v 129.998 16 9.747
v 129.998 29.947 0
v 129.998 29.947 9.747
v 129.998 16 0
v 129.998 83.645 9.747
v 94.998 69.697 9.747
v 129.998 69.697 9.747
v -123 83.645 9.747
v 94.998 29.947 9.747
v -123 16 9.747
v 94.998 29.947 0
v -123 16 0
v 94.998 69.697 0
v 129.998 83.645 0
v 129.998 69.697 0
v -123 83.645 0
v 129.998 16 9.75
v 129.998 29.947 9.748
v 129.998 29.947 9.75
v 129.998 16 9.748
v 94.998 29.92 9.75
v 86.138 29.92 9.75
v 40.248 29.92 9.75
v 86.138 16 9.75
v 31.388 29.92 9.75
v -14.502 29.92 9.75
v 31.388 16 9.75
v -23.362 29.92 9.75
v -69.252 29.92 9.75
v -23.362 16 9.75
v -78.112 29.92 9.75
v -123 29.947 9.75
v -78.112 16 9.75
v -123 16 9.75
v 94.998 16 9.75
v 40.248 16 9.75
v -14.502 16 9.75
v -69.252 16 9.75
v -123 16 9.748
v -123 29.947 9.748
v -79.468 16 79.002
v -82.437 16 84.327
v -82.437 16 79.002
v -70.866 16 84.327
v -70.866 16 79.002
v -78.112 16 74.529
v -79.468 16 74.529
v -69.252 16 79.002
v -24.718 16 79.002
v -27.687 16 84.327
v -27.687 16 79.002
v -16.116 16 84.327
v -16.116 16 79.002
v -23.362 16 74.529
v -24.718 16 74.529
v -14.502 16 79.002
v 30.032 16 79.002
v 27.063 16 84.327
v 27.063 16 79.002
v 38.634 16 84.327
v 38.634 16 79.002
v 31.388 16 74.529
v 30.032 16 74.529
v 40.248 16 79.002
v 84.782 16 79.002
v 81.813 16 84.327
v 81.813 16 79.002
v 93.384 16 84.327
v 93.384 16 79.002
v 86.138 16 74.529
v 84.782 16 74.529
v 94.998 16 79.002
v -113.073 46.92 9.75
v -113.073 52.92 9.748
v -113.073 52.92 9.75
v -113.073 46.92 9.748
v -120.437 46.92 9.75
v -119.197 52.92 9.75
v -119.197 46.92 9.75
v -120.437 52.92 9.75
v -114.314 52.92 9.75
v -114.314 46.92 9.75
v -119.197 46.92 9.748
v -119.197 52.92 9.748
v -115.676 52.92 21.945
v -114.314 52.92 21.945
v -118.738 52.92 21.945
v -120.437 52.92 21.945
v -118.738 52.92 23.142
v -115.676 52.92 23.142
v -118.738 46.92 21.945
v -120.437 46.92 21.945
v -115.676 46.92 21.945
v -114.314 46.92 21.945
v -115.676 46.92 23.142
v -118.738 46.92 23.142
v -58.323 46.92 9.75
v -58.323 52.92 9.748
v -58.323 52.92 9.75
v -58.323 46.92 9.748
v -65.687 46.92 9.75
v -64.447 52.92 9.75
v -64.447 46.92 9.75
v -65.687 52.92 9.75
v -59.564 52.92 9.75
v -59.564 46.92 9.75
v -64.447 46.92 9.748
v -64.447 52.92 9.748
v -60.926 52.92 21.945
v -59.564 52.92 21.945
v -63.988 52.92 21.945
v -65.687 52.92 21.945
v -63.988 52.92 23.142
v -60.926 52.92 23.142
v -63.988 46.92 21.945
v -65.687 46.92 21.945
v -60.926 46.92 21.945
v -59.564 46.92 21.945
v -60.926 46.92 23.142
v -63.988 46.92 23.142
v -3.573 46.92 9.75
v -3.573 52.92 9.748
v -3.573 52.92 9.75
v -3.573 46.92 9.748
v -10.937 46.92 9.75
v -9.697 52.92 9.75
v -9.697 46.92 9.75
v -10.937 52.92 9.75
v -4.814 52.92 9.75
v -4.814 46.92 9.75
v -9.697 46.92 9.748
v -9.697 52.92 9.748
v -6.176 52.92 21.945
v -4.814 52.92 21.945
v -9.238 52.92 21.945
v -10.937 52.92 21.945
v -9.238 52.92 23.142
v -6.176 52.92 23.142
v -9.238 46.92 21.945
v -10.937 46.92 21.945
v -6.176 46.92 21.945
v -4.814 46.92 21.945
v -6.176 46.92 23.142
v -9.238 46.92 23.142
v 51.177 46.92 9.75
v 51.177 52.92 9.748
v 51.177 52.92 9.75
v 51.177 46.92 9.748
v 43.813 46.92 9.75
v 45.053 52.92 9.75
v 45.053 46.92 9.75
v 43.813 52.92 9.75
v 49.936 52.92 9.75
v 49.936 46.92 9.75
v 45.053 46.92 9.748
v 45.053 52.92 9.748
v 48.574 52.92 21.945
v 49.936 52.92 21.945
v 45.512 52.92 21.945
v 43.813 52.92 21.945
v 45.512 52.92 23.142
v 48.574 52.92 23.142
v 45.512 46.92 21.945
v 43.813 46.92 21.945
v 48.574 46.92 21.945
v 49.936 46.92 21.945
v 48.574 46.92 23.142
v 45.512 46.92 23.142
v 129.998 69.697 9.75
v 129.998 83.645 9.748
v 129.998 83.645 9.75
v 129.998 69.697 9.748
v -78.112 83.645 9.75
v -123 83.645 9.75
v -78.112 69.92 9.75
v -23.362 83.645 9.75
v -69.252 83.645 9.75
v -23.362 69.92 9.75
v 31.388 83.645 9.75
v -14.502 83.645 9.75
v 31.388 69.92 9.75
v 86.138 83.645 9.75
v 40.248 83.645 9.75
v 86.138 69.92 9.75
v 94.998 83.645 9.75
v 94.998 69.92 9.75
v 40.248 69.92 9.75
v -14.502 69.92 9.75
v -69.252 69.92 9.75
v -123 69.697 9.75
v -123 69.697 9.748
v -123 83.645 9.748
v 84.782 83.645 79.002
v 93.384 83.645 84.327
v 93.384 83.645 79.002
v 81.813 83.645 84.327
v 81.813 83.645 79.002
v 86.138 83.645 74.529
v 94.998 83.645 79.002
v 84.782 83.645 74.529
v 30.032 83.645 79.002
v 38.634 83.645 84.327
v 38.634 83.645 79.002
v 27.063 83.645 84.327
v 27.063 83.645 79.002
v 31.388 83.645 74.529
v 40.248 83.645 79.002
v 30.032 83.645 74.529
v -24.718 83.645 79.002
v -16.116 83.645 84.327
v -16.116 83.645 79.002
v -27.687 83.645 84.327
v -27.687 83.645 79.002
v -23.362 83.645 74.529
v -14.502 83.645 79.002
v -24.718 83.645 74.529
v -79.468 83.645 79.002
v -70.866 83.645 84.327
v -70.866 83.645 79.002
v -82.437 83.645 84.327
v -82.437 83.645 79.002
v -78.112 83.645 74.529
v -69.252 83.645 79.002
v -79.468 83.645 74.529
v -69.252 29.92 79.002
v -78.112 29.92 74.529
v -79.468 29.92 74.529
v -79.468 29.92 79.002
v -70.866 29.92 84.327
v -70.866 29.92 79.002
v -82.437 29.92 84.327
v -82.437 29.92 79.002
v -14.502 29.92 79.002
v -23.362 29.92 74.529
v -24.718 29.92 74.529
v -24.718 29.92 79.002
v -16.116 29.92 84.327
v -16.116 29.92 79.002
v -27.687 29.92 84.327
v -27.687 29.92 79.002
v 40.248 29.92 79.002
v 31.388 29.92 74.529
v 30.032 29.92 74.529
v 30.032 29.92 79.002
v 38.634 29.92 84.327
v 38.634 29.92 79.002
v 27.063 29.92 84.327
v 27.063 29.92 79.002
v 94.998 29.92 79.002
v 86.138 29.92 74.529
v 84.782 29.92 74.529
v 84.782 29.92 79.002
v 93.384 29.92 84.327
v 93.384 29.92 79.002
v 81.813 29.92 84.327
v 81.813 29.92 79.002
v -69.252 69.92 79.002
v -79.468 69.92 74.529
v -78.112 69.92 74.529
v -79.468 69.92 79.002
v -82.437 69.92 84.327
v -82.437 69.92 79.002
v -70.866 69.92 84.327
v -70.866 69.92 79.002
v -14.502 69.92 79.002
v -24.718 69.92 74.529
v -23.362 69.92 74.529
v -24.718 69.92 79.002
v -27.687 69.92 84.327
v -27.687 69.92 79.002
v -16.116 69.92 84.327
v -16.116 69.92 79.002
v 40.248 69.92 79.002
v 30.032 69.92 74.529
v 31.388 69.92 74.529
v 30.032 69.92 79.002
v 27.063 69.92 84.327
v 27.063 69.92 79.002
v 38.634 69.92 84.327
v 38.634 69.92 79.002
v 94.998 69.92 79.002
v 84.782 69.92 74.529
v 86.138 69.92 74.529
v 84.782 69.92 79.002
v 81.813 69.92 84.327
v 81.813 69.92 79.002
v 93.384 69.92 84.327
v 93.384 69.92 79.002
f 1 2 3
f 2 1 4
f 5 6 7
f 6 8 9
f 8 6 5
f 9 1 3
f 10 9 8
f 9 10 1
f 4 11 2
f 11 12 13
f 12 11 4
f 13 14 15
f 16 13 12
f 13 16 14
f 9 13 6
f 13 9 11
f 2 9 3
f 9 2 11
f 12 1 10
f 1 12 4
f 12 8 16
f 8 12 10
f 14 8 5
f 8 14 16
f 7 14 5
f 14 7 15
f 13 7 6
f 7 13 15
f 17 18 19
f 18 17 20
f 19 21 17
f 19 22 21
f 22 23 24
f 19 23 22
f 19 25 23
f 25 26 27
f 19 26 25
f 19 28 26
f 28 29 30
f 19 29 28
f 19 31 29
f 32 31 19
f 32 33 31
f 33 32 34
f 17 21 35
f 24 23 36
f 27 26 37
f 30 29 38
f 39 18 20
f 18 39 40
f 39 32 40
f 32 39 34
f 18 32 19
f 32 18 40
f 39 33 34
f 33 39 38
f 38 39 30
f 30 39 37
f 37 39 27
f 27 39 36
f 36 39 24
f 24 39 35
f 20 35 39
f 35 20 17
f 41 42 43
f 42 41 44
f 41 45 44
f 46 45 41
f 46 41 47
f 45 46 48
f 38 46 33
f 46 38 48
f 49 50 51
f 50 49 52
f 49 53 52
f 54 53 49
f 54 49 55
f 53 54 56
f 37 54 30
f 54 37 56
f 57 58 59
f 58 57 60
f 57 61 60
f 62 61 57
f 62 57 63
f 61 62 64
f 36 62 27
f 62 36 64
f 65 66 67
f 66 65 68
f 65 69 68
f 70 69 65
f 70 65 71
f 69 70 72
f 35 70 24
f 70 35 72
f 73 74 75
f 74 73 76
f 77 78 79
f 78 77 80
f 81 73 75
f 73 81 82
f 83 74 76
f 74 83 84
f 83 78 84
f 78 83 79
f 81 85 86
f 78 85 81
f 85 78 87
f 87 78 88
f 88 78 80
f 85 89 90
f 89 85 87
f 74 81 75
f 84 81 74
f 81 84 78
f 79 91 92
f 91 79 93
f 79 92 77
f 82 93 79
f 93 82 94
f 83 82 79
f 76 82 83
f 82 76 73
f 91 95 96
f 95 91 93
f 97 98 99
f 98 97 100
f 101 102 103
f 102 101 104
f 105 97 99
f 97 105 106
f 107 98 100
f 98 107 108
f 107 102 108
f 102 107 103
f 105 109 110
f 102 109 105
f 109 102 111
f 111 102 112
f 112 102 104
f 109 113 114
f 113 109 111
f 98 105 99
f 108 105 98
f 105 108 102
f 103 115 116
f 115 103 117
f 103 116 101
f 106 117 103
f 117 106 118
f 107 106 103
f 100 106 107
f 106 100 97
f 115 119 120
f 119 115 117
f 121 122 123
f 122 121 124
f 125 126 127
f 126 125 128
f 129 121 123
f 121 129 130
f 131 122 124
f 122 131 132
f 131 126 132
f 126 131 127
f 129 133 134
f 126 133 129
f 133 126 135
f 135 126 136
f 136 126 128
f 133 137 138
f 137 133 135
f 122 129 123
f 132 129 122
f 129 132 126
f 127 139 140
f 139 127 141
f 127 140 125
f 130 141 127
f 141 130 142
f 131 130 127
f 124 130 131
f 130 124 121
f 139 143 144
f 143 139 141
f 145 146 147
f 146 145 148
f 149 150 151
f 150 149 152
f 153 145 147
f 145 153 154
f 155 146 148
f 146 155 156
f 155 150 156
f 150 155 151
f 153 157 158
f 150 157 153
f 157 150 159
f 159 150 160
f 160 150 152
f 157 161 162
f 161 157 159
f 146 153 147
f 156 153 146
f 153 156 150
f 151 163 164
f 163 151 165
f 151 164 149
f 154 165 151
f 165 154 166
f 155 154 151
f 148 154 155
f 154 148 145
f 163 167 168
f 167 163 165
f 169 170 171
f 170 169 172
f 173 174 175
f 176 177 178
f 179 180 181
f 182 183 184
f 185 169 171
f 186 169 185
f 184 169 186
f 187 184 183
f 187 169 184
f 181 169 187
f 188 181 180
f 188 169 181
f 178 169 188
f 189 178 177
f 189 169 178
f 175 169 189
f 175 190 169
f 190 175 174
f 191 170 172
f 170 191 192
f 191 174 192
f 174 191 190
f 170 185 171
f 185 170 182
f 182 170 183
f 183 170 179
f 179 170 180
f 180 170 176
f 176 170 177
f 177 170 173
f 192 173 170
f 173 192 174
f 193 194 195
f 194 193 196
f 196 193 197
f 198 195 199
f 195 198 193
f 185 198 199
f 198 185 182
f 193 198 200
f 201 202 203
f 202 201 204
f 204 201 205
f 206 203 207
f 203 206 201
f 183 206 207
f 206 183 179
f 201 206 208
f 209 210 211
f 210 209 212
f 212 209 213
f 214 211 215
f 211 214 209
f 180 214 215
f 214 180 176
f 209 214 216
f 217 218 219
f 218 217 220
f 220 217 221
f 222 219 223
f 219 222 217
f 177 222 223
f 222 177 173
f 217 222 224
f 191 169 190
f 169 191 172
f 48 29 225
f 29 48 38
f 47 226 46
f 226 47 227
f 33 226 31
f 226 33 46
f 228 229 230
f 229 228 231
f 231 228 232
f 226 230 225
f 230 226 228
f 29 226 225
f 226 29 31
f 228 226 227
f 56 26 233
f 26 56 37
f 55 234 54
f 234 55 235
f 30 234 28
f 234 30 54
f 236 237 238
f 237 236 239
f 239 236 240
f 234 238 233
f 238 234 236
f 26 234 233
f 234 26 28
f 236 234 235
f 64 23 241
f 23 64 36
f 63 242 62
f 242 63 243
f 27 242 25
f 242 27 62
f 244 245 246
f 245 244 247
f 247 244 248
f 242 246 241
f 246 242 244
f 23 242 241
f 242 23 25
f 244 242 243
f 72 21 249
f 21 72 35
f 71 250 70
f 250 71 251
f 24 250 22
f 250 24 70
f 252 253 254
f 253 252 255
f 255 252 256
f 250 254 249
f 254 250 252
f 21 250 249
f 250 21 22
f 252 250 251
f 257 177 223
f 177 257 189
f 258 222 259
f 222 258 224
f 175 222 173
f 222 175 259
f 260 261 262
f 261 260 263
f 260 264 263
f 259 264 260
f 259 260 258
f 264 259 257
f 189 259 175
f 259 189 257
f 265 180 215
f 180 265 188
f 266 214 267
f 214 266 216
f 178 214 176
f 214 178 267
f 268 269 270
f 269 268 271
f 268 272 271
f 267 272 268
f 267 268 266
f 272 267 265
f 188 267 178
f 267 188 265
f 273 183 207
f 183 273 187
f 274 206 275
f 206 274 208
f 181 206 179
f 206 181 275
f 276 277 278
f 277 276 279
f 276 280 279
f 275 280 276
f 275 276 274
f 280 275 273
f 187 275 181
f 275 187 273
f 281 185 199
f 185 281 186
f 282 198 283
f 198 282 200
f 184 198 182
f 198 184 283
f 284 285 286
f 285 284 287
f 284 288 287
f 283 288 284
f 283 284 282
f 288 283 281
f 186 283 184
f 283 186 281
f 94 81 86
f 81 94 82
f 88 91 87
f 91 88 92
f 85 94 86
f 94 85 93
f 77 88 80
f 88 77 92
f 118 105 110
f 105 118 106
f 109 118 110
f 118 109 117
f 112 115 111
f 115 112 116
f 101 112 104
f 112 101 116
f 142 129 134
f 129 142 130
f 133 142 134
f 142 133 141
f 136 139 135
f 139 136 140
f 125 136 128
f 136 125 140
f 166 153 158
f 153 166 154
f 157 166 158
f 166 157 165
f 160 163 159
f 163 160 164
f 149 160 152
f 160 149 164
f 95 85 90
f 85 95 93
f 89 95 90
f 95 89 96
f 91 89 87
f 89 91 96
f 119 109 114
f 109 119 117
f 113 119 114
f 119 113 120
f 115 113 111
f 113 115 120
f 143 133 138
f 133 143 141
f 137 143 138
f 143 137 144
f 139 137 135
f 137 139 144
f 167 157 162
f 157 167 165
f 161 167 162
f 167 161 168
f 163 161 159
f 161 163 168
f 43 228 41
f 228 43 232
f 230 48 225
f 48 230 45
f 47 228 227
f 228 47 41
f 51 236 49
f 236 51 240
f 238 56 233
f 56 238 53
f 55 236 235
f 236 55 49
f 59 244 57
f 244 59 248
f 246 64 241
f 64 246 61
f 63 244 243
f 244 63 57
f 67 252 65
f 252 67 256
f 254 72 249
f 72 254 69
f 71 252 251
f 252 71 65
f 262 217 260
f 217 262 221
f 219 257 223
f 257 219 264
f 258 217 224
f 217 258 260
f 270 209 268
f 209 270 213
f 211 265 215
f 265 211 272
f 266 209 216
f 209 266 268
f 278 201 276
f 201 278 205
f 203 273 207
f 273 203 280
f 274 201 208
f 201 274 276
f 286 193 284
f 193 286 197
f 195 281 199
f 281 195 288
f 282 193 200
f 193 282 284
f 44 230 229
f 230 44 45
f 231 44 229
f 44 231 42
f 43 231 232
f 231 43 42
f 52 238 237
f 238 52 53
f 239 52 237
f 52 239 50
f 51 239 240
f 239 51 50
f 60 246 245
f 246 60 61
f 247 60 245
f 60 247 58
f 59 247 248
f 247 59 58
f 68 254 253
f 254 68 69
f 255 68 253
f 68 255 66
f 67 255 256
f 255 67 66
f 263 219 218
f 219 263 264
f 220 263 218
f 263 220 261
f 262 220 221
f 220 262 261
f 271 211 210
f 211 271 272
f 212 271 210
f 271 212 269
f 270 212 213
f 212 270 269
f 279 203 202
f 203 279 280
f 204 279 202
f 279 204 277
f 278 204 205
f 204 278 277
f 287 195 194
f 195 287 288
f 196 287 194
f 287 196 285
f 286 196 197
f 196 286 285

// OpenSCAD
// Parameterized version of top_rect_cubes_simplified_jay.scad
// Parameters (edit these):
//   width:    overall X width (right side shifts)
//   length:   overall Y depth (scales from front face)
//   arm_gap:  gap in Y between the two arms (overrides the scaled gap)
//
// Knob-centering behavior:
// - Features in the mid-band (the small "knobs" on the large planes) stay centered
//   between the arms when arm_gap changes (they shift by half the gap delta).
//
// Identity check (matches the source geometry exactly) when:
//   width  = 252.997994;
//   length = 59.644998;
//   arm_gap = 31.750000;

width   = 252.997994;
length  = 59.644998;
arm_gap = 39.750000;

// --- Reference constants (from source file) ---
_x_min      = -123.000008;
_x_split    = 94.997986;
_width_orig = 252.997994;

// Y reference landmarks (original)
// front arm ends at _y_front_end, back arm starts at _y_back_start.
// mid-band corresponds to the small "knobs" on the large planes.
_y_min           = 15.999999;
_y_front_end     = 29.946999;
_y_mid_band_start = 42.919998;
_y_mid_band_end   = 48.919998;
_y_back_start    = 61.696999;
_y_max           = 75.644997;
_length_orig     = 59.644998;
_arm_gap_orig    = 31.750000;

// --- Mapping functions ---
// X: shift the right side to hit the desired width
function map_x(x) = (x < _x_split) ? x : (x + (width - _width_orig));

// Y: first scale overall length from the front face, then shift the back-arm region
// to achieve the requested arm_gap. Mid-band features shift by half the gap delta.
function scale_y(y) = _y_min + (y - _y_min) * (length / _length_orig);

function _front_end_s() = scale_y(_y_front_end);
function _back_start_s() = scale_y(_y_back_start);
function _mid_start_s() = scale_y(_y_mid_band_start);
function _mid_end_s()   = scale_y(_y_mid_band_end);

function _gap_scaled() = _back_start_s() - _front_end_s();
function _gap_delta()  = arm_gap - _gap_scaled();

function map_y(y) =
  let(
    y0 = scale_y(y),
    bs = _back_start_s(),
    ms = _mid_start_s(),
    me = _mid_end_s(),
    dg = _gap_delta()
  )
  (y0 < bs)
    ? ((y0 >= ms && y0 <= me) ? (y0 + dg/2) : y0)
    : (y0 + dg);

module rect_prism_m(x1,y1,x2,y2,z0,h){
  translate([map_x(x1), map_y(y1), z0])
    cube([map_x(x2)-map_x(x1), map_y(y2)-map_y(y1), h], center=false);
}



// Rewritten from layered polygon rebuild into rectilinear cubes
// Each slab is decomposed into axis-aligned rectangles and emitted as cubes.
// Note: This preserves orthogonal geometry; curved/diagonal features (if any) are approximated.

//module rect_prism_m(x1,y1,x2,y2,z0,h){
//  translate([x1,y1,z0]) cube([x2-x1, y2-y1, h], //center=false);
//}

module slab_1() {
  union() {
    rect_prism_m(94.997986,15.999999,129.997986,29.946999,0,9.747);
    rect_prism_m(-123.000008,15.999999,94.997986,75.644997,0,9.747);
    rect_prism_m(94.997986,61.696999,129.997986,75.644997,0,9.747);
  }
}

module slab_2() {
  union() {
    rect_prism_m(-123.000008,15.999999,129.997986,29.946999,9.748,0.002);
    rect_prism_m(-119.196615,42.919998,-113.073431,48.919998,9.748,0.002);
    rect_prism_m(-64.44663,42.919998,-58.323427,48.919998,9.748,0.002);
    rect_prism_m(-9.696628,42.919998,-3.573428,48.919998,9.748,0.002);
    rect_prism_m(45.053381,42.919998,51.176573,48.919998,9.748,0.002);
    rect_prism_m(-123.000008,61.696999,129.997986,75.644997,9.748,0.002);
  }
}

module slab_3_4_5() {
  // Consolidated: slabs 3, 4, and 5 were contiguous in Z and largely repeated.
  // This version merges the eight vertical posts into single prisms and keeps the two brace bands.
  union() {
    // Vertical posts (merged height: 64.779)
    rect_prism_m(-78.112015,15.999999,-69.252014,29.919998,9.750000,64.779000);
    rect_prism_m(-23.362015,15.999999,-14.502014,29.919998,9.750000,64.779000);
    rect_prism_m(31.387985,15.999999,40.247986,29.919998,9.750000,64.779000);
    rect_prism_m(86.137985,15.999999,94.997986,29.919998,9.750000,64.779000);
    rect_prism_m(-78.112015,61.919998,-69.252014,75.644997,9.750000,64.779000);
    rect_prism_m(-23.362015,61.919998,-14.502014,75.644997,9.750000,64.779000);
    rect_prism_m(31.387985,61.919998,40.247986,75.644997,9.750000,64.779000);
    rect_prism_m(86.137985,61.919998,94.997986,75.644997,9.750000,64.779000);

    // Lower brace band (wider)
    rect_prism_m(-120.437410,42.919998,-114.314075,48.919998,9.750000,12.195000);
    rect_prism_m(-65.687418,42.919998,-59.564071,48.919998,9.750000,12.195000);
    rect_prism_m(-10.937418,42.919998,-4.814072,48.919998,9.750000,12.195000);
    rect_prism_m(43.812582,42.919998,49.935932,48.919998,9.750000,12.195000);

    // Upper thin brace band (narrower)
    rect_prism_m(-118.738005,42.919998,-115.676272,48.919998,21.945000,1.197000);
    rect_prism_m(-63.988003,42.919998,-60.926268,48.919998,21.945000,1.197000);
    rect_prism_m(-9.238005,42.919998,-6.176269,48.919998,21.945000,1.197000);
    rect_prism_m(45.511995,42.919998,48.573739,48.919998,21.945000,1.197000);
  }
}




module slab_6() {
  union() {
    rect_prism_m(-79.467536,15.999999,-69.252014,29.919998,74.529,4.4726);
    rect_prism_m(-24.717536,15.999999,-14.502014,29.919998,74.529,4.4726);
    rect_prism_m(30.032464,15.999999,40.247986,29.919998,74.529,4.4726);
    rect_prism_m(84.782464,15.999999,94.997986,29.919998,74.529,4.4726);
    rect_prism_m(-79.467536,61.919998,-69.252014,75.644997,74.529,4.4726);
    rect_prism_m(-24.717536,61.919998,-14.502014,75.644997,74.529,4.4726);
    rect_prism_m(30.032464,61.919998,40.247986,75.644997,74.529,4.4726);
    rect_prism_m(84.782464,61.919998,94.997986,75.644997,74.529,4.4726);
  }
}

module slab_7() {
  union() {
    rect_prism_m(-82.437039,15.999999,-70.865755,29.919998,79.0016,5.3254);
    rect_prism_m(-27.687036,15.999999,-16.115755,29.919998,79.0016,5.3254);
    rect_prism_m(27.062964,15.999999,38.634246,29.919998,79.0016,5.3254);
    rect_prism_m(81.812961,15.999999,93.384242,29.919998,79.0016,5.3254);
    rect_prism_m(-82.437039,61.919998,-70.865755,75.644997,79.0016,5.3254);
    rect_prism_m(-27.687036,61.919998,-16.115755,75.644997,79.0016,5.3254);
    rect_prism_m(27.062964,61.919998,38.634246,75.644997,79.0016,5.3254);
    rect_prism_m(81.812961,61.919998,93.384242,75.644997,79.0016,5.3254);
  }
}

module top() {
  union() {
    slab_1();
    slab_2();  
    slab_3_4_5();
    slab_6();
    slab_7();
  }
}

top();
